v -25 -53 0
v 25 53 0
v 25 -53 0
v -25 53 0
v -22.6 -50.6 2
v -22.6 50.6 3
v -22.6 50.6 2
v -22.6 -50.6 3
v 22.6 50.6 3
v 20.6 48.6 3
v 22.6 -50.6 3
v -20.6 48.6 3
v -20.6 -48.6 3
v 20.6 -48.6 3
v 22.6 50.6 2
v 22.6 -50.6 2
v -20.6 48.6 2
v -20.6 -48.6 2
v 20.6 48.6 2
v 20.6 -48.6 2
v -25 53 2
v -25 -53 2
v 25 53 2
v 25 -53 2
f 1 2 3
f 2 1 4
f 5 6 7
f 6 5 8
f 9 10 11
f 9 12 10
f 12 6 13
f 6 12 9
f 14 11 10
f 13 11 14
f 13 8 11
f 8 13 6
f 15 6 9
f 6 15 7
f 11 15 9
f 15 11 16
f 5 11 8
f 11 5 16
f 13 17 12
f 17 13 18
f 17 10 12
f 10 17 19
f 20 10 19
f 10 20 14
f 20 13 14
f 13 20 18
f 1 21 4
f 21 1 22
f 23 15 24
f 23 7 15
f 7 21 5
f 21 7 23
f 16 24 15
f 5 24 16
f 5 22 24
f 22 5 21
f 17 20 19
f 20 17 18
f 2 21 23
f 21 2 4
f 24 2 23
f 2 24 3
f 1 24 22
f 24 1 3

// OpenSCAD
// file: vars.scad
echo(version=version());
//All dimensions are in mm


batteryHolder3s=[69,110.0];
batteryHolder2s=[50,106.0];
h=32;    // height of box without lid
wall=2;  // wall thickness
postloc=28; // where the edge posts are in y direction
postsize=[1.85,3] ;  //Dimension of posts in x and y
basethickness=3;
holdslotloc=81.5;
holdslotwidth=10;
wireholddiameter = 5.0;
switchcutout = [13.7, 9.2];
switchDepth = 16.0;
//Perforation size: 23mm*10.5mm
voltMeterCutout=[24,11.5];
// Allow for slip by making the ridge a little smaller than the box it fits into.
interference=0.8;
Usb15=[17.2,11.7];
usbCPortStandoff=2.0;
usbConnector=[10,7.0,4.2];
circuitBoardThick=2.0;

Usb15Package=[Usb15.x+usbCPortStandoff, Usb15.y,circuitBoardThick+usbConnector.z];
// main file
//Cover with a slot for the wire egress
//All dimensions are in mm


// Create the exterior box, subtract the interior, and subtract the slot.

include <vars.scad>;
translate ([0,0,0])
linear_extrude(height = wall)
            square([batteryHolder2s.x, batteryHolder2s.y
            ], center = true);
 // now the inside rim is another box minus a other box...
 //  taking into account that we need to give some slip fit with the interference parameter
difference() {
    linear_extrude(height = basethickness)
            square([batteryHolder2s.x-2*wall-interference, batteryHolder2s.y-2*wall-interference
            ], center = true);
    translate ([0,0,0])
    linear_extrude(height = basethickness)
            square([batteryHolder2s.x-4*wall-interference, batteryHolder2s.y-4*wall-interference
            ], center = true);
}
